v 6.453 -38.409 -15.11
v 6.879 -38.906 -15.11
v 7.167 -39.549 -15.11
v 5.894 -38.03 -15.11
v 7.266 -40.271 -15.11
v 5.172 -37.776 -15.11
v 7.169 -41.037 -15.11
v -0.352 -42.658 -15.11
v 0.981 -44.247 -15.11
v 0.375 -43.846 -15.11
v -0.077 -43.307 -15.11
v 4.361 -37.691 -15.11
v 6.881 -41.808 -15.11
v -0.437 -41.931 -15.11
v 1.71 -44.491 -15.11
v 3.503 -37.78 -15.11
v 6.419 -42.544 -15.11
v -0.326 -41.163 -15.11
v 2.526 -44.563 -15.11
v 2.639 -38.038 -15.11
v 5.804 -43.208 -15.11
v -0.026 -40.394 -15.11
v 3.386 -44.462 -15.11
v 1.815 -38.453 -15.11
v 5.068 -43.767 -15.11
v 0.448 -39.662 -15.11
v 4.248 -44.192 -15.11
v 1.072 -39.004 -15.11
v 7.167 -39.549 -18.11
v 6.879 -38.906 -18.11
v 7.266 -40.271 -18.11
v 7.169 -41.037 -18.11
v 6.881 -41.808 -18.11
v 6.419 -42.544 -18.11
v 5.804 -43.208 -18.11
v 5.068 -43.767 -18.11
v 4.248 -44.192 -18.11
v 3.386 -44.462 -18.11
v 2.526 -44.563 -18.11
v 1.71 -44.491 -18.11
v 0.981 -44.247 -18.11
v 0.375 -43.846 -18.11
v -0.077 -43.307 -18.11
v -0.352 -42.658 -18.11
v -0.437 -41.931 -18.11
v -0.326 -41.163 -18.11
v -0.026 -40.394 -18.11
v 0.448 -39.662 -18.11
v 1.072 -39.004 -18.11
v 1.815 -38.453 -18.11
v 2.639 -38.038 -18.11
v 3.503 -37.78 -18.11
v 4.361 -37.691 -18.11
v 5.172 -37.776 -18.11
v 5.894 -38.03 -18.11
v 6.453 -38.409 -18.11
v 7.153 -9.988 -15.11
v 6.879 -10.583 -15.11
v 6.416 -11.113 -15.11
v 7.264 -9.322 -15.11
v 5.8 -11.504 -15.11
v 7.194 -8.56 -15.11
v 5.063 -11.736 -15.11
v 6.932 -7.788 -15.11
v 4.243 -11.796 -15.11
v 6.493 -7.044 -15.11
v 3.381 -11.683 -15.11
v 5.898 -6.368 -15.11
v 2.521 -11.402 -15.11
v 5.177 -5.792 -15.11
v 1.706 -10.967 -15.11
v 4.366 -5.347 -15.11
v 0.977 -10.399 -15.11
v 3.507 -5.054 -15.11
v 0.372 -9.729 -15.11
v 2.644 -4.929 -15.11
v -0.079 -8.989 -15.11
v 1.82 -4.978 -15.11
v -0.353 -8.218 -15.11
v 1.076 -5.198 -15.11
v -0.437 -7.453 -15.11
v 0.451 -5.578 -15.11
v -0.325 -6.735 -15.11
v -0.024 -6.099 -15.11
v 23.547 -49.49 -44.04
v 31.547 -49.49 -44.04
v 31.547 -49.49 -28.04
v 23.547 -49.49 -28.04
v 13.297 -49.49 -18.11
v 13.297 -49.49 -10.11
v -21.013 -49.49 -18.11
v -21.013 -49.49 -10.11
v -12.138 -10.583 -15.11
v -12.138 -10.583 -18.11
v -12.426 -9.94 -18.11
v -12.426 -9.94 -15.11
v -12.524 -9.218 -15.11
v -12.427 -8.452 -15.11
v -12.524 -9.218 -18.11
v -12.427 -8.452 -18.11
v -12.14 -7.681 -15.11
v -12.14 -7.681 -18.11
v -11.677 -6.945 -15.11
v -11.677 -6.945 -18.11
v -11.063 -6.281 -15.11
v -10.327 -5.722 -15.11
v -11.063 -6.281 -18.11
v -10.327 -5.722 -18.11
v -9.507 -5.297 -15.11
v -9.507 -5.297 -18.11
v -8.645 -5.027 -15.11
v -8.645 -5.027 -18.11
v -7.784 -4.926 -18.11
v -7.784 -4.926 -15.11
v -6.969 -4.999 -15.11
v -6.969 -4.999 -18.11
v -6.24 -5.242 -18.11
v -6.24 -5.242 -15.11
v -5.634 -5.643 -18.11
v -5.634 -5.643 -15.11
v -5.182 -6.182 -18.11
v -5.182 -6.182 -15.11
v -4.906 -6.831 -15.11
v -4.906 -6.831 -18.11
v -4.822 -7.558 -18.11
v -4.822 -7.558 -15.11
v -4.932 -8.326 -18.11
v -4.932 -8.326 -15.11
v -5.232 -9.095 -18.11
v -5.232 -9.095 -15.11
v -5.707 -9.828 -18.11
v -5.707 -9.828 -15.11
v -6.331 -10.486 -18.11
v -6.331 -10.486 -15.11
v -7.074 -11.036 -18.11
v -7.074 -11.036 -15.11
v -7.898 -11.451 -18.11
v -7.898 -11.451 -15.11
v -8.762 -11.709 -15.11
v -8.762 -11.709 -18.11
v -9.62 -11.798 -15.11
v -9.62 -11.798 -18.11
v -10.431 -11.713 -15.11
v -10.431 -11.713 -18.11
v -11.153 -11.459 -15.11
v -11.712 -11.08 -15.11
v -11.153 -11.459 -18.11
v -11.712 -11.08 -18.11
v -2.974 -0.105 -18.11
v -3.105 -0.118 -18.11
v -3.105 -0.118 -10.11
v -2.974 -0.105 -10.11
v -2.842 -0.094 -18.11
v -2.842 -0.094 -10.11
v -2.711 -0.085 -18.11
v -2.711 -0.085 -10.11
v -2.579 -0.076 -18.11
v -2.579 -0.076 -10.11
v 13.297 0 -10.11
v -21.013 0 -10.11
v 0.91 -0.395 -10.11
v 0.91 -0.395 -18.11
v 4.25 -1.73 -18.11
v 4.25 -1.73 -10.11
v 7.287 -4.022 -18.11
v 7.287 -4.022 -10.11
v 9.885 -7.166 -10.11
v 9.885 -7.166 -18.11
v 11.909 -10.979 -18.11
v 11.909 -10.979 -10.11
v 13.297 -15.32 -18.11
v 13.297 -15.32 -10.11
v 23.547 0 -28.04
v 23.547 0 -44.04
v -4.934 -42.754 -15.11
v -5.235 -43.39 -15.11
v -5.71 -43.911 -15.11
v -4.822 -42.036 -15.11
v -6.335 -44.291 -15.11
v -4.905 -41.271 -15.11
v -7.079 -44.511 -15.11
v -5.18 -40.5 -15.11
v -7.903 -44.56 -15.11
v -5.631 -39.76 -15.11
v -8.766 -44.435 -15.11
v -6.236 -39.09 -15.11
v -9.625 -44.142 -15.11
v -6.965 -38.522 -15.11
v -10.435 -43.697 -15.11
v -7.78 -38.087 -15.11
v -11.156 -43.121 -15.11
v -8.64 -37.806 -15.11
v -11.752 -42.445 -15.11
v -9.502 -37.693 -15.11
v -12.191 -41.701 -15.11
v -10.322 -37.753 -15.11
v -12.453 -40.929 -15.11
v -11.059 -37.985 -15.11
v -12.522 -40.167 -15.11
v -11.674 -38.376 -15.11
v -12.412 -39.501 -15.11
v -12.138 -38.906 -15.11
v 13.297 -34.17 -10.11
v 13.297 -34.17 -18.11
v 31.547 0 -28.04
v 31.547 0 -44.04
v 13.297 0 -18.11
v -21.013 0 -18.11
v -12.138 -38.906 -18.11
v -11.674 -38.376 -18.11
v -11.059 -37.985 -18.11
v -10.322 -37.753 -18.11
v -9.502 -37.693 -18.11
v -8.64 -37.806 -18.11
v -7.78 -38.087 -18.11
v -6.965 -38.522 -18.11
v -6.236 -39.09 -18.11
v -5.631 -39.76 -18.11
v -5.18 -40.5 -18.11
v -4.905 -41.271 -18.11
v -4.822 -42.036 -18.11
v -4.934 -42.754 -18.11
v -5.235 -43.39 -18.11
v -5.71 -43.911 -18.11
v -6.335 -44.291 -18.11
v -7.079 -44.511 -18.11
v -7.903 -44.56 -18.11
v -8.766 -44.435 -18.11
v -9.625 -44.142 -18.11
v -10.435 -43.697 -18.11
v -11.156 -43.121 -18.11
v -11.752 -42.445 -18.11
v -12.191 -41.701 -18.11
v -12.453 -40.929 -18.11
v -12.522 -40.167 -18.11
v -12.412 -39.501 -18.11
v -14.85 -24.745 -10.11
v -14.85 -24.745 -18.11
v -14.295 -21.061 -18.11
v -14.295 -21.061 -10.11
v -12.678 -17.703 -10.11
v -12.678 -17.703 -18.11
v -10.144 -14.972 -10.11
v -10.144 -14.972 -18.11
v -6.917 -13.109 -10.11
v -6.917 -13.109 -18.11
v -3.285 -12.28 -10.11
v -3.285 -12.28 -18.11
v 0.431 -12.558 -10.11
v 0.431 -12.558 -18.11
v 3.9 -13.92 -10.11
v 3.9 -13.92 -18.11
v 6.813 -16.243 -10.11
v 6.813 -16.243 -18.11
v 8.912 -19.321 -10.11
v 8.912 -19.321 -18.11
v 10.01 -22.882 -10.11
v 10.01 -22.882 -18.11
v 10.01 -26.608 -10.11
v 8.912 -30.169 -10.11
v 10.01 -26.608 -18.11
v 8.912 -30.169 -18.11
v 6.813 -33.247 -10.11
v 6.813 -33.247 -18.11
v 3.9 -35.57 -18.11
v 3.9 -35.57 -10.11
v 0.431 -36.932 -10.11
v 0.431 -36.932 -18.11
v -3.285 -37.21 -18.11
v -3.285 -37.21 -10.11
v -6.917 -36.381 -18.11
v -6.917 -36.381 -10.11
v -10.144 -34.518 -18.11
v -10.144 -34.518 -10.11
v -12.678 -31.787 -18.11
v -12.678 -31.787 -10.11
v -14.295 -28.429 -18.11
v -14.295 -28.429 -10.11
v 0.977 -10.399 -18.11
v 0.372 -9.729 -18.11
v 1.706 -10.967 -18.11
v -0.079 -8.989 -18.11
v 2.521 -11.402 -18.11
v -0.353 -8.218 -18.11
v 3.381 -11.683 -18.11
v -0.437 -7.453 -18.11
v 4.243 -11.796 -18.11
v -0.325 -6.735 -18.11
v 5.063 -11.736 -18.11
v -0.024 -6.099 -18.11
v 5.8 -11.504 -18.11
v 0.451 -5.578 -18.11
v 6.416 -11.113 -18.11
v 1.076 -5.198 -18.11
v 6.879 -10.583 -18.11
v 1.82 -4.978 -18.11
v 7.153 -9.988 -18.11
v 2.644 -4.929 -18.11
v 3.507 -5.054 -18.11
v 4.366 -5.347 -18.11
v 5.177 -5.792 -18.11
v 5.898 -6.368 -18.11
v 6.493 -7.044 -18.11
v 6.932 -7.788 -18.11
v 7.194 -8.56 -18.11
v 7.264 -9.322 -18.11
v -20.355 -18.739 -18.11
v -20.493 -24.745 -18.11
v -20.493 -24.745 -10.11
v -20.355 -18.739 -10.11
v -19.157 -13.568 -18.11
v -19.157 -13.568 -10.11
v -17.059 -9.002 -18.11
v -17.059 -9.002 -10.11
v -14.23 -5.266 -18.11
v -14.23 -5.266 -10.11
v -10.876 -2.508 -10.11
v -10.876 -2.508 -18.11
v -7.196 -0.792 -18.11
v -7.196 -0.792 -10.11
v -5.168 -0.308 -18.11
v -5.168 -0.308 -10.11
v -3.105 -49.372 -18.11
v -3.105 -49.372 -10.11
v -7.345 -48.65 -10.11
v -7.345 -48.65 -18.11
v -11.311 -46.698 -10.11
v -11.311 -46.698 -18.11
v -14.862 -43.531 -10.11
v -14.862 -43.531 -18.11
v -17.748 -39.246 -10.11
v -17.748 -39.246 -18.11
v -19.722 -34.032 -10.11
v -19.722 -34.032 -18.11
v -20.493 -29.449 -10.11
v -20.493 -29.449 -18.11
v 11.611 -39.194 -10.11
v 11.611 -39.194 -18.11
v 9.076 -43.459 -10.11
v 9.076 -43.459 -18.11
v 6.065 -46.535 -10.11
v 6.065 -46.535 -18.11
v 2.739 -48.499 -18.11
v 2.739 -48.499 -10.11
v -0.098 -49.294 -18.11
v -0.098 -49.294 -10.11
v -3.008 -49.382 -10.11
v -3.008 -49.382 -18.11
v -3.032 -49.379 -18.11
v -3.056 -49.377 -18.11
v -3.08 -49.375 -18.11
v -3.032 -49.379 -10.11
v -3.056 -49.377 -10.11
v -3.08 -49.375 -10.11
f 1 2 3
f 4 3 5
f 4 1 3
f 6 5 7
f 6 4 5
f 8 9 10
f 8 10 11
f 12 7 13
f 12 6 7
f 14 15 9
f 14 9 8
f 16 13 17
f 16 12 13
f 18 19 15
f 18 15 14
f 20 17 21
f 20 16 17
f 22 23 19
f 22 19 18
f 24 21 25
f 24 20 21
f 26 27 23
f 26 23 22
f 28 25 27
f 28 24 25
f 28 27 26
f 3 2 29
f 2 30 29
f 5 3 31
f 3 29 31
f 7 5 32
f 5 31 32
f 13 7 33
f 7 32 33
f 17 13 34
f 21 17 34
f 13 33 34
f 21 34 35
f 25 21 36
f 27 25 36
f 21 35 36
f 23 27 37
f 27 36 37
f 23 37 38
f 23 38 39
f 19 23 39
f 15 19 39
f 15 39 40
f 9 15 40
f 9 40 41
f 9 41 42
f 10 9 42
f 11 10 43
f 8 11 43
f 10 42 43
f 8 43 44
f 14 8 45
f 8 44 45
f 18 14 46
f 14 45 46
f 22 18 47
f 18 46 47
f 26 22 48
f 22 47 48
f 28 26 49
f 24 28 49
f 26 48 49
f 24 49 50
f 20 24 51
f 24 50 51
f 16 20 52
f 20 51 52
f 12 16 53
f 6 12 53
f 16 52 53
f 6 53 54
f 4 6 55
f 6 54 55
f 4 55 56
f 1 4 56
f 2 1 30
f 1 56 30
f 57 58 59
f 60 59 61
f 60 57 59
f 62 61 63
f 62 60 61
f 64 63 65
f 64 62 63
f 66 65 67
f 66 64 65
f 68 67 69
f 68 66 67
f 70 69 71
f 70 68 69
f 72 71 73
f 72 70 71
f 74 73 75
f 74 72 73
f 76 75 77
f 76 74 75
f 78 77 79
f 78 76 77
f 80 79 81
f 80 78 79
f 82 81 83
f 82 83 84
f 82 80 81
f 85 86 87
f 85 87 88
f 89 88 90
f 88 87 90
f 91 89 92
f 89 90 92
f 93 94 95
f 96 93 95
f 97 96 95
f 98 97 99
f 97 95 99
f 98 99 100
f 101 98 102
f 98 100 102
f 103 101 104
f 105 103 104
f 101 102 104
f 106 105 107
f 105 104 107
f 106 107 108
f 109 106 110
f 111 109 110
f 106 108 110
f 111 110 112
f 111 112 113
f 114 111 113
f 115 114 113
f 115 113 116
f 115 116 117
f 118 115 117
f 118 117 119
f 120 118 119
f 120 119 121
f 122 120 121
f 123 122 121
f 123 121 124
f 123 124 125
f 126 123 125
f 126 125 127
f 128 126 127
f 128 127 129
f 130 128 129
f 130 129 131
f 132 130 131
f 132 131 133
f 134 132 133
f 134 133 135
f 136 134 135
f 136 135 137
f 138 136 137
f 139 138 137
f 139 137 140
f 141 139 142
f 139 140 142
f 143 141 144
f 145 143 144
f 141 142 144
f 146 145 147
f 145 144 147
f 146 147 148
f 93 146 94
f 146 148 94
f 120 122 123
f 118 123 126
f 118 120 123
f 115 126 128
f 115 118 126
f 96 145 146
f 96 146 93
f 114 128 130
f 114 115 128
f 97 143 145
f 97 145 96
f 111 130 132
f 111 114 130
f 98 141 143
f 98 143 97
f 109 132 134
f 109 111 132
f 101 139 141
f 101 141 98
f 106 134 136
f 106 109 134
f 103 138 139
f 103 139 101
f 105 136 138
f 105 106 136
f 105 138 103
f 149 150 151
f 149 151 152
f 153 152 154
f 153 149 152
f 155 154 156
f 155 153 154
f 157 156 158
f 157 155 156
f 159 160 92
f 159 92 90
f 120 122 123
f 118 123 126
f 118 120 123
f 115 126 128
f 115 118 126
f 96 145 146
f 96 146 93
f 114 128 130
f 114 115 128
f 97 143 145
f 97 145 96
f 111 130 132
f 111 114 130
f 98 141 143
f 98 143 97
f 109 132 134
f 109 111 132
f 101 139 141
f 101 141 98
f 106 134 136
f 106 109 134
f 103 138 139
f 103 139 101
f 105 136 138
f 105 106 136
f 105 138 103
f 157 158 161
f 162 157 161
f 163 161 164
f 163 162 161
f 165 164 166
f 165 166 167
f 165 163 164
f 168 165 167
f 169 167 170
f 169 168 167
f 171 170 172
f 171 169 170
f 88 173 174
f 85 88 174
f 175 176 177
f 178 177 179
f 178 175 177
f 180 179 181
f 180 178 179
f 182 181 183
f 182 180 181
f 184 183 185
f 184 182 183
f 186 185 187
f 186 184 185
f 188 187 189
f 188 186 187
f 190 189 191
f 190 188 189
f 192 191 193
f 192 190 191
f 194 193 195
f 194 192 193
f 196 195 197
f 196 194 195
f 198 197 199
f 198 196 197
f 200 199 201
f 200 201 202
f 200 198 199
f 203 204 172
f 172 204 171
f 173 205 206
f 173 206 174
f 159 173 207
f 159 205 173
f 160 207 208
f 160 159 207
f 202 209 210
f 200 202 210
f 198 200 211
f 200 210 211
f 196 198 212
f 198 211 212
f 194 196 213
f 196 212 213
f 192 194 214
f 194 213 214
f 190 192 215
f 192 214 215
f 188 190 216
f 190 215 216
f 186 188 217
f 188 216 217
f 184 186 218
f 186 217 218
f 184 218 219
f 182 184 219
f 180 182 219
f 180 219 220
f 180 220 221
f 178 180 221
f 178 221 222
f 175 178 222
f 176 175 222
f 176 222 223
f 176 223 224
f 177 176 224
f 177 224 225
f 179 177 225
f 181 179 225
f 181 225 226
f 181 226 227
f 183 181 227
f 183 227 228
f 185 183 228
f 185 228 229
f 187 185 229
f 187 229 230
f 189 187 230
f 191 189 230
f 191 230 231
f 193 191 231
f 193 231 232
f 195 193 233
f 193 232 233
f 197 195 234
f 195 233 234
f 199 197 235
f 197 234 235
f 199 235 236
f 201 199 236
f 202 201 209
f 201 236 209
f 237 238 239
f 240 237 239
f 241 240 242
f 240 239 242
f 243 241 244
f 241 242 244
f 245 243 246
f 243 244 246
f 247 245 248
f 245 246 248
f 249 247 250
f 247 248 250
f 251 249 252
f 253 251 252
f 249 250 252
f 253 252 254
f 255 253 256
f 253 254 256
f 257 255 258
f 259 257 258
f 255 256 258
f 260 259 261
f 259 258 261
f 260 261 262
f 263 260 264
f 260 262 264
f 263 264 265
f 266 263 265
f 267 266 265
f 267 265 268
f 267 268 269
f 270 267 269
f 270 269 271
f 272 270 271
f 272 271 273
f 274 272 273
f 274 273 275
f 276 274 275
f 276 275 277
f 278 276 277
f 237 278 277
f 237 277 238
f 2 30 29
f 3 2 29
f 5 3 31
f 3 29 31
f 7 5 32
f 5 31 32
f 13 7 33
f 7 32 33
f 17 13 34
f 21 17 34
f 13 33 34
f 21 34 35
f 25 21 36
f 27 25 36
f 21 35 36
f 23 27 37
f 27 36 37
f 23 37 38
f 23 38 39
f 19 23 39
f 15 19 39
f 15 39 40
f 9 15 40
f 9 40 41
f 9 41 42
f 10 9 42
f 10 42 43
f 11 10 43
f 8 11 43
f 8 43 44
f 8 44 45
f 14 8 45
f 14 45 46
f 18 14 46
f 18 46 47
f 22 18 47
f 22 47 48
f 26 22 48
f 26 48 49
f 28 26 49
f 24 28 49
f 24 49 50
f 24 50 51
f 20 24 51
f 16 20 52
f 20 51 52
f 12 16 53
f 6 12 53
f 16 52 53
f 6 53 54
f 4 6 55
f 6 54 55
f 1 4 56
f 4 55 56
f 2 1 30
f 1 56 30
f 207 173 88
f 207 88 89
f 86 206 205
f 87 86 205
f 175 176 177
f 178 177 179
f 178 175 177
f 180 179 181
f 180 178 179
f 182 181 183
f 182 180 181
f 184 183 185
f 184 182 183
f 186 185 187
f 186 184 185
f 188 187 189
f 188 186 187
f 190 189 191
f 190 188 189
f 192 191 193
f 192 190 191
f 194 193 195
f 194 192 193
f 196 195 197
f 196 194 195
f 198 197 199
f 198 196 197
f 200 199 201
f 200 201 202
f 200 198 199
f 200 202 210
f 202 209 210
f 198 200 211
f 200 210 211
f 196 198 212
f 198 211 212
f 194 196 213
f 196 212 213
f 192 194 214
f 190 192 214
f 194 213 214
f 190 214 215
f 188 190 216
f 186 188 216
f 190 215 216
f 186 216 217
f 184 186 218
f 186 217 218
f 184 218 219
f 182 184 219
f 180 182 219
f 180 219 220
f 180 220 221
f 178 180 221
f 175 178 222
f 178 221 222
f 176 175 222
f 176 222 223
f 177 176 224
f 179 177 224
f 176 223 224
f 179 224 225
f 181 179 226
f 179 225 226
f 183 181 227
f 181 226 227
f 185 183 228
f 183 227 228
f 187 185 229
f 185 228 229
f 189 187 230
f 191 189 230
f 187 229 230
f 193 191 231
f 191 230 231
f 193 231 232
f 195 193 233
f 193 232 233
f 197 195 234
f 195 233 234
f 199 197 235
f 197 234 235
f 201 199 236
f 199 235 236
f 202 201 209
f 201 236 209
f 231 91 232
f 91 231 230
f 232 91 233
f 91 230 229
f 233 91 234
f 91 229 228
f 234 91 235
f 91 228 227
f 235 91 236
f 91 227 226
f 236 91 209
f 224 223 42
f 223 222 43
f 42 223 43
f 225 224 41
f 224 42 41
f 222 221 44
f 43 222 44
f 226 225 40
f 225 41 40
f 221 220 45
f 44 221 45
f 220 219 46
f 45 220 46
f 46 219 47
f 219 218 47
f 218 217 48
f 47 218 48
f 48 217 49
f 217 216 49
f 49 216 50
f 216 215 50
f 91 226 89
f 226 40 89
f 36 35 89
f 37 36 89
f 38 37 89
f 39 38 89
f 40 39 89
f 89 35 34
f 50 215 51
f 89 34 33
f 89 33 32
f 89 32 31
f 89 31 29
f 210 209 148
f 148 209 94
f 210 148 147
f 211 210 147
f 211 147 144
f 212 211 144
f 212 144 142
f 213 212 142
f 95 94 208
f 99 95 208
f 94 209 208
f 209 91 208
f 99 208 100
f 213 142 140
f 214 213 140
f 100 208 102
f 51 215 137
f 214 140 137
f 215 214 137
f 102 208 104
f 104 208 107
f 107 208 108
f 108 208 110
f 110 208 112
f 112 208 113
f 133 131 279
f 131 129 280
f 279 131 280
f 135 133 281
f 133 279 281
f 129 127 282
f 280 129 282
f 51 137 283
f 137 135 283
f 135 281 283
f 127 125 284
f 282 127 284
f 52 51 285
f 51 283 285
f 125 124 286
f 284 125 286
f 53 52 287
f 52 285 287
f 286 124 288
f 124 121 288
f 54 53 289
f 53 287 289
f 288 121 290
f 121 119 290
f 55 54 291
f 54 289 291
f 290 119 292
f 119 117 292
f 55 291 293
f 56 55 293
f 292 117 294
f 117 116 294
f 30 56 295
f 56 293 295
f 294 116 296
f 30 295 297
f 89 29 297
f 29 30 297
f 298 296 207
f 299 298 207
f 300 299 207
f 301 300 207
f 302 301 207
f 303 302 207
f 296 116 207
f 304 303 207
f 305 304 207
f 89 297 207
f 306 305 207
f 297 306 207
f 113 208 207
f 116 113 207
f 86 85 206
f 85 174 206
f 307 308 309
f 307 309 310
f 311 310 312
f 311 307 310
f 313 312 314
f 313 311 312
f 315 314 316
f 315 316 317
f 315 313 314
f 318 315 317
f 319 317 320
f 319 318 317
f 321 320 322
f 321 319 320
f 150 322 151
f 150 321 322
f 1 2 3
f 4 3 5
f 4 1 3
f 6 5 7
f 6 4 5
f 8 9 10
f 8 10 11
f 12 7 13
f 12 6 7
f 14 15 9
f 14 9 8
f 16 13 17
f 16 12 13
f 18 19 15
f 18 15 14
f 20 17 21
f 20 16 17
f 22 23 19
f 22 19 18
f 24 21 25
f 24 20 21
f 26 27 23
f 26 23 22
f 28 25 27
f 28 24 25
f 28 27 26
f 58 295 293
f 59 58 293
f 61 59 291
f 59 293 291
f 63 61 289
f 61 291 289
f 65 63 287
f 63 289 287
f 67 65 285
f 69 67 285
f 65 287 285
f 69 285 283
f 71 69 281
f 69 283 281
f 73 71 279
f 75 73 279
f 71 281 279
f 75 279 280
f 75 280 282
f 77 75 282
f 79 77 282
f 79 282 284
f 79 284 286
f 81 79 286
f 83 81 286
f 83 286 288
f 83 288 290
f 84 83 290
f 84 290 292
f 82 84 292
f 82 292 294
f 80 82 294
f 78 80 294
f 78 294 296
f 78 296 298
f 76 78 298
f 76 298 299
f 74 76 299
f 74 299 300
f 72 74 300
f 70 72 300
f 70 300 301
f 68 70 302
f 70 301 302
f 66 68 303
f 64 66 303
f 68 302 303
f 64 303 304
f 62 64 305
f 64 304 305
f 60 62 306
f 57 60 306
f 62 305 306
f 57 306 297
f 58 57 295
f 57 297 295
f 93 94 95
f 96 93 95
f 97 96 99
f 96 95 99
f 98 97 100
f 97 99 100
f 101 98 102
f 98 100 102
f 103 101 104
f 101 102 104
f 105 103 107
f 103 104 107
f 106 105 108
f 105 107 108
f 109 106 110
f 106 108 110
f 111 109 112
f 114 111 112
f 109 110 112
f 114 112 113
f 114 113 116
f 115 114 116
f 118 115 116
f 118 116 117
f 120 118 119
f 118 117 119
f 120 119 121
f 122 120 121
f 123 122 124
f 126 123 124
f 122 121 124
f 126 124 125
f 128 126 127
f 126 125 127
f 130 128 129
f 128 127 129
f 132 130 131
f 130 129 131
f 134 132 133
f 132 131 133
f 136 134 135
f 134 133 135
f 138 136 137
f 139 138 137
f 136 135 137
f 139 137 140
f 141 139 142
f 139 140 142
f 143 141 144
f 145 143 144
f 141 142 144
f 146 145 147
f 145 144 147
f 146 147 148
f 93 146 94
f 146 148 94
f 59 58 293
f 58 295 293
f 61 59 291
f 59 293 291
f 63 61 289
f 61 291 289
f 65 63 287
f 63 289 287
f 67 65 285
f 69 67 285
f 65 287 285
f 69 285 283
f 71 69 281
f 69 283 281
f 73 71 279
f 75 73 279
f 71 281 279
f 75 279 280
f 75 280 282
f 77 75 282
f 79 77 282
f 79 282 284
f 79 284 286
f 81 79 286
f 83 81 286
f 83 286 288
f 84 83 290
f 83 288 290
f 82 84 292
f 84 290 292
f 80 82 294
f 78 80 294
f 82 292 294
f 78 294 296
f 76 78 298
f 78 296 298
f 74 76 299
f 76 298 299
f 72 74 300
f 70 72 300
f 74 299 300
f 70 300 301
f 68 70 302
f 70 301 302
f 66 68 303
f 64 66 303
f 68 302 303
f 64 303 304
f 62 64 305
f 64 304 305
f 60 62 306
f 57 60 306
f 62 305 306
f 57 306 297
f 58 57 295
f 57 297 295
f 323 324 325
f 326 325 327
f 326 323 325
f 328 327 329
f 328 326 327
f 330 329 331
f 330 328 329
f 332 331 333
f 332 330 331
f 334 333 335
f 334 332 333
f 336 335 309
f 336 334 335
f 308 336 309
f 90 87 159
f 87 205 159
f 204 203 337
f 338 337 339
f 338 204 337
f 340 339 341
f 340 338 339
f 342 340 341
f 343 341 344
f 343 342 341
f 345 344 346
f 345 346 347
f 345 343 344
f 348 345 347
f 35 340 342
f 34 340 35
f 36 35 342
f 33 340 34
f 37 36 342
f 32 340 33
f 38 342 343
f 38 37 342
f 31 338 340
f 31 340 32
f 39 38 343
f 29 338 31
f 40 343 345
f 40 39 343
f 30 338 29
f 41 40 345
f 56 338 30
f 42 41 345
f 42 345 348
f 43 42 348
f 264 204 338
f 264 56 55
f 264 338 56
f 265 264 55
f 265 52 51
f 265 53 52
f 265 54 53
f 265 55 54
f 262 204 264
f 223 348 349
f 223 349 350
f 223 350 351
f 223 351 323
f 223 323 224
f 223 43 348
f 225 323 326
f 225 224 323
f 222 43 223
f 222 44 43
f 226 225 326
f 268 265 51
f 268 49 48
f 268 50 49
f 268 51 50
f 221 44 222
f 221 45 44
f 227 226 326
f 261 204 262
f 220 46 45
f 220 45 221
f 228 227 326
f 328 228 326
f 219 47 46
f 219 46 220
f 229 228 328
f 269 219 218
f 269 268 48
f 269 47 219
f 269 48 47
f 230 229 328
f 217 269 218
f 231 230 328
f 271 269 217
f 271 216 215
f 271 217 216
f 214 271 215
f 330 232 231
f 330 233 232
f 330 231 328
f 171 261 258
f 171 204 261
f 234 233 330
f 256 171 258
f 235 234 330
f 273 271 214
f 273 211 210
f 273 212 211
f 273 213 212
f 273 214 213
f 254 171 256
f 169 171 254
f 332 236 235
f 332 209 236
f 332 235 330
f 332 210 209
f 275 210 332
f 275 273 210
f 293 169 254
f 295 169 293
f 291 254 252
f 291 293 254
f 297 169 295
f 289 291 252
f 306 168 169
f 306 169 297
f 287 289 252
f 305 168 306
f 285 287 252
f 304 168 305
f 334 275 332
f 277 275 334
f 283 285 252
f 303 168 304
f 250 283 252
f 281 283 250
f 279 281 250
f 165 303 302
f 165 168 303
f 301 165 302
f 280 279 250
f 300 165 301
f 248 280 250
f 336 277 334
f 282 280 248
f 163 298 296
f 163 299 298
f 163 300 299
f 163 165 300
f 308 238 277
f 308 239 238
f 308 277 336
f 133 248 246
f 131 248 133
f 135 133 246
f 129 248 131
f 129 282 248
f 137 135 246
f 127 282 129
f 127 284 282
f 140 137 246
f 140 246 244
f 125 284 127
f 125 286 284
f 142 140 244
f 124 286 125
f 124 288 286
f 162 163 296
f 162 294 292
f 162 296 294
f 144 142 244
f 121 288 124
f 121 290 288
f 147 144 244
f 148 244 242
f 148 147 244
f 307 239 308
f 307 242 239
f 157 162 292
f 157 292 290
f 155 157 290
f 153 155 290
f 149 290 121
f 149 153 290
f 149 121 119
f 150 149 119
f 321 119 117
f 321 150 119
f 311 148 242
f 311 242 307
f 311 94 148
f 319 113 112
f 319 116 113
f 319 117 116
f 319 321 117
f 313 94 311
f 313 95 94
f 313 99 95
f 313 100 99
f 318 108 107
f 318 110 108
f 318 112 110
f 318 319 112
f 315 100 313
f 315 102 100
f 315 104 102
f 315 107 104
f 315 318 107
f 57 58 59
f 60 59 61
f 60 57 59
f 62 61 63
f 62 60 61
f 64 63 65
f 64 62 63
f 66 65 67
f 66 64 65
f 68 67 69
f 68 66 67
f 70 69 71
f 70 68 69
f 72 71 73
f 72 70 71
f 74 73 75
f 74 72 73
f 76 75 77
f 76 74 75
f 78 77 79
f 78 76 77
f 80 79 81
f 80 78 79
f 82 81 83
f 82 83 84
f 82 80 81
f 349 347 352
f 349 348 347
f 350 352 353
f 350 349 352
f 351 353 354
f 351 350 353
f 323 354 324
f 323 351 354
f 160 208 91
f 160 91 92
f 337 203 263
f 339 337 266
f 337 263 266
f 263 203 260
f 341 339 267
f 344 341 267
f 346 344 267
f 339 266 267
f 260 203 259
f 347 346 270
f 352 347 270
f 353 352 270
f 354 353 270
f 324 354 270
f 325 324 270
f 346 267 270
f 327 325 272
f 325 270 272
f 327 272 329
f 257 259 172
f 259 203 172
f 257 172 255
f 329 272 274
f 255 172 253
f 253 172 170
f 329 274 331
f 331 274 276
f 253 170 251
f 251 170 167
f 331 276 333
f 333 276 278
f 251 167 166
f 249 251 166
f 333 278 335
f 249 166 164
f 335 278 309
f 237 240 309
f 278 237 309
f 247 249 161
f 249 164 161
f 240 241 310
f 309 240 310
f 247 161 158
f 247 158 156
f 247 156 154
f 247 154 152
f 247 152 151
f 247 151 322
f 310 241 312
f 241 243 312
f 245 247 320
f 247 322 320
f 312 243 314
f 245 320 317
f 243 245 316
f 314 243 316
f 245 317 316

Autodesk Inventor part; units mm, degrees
ref_plane "YZ Plane" through (0, 0, 0) normal (1, 0, 0) x (0, 1, 0)
sketch "Основной эскиз" plane through (0, 0, 0) normal (0, 1, 0) x (-1, 0, 0)
  line L0 (21.0127, -18.1102) -> (-13.2973, -18.1102)
  line L1 (21.0127, -18.1102) -> (21.0127, -10.1102)
  line L2 (21.0127, -10.1102) -> (-13.2973, -10.1102)
  line L3 (20.451, -28.0402) -> (-43.6243, -28.0402)
  line L4 (-23.5473, -28.0402) -> (-23.5473, -44.0402)
  line L5 (-23.5473, -44.0402) -> (-31.5473, -44.0402)
  line L6 (-31.5473, -44.0402) -> (-31.5473, -28.0402)
  line L7 (-31.5473, -28.0402) -> (-13.2973, -10.1102)
  line L8 (-23.5473, -28.0402) -> (-13.2973, -18.1102)
  line L9 (-5.2293, -36.0402) -> (-38.0765, -36.0402)
  line L10 (31.3847, -10.1102) -> (-49.5844, -10.1102)
  line L11 (3.1555, -40.2525) -> (3.1555, 5.5167)
  point P0 (0, 0)
  point P1 (-23.5473, -36.0402)
  dimension "d0" = 34.31
  dimension "d2" = 8
  dimension "d3" = 34.31
  dimension "d5" = 8
  dimension "d7" = 17.93
  dimension "d8" = 25.93
  dimension "d9" = 10.25
  dimension "d10" = 8
extrude "ВыдавливаниеОсновной" add sketch "Основной эскиз" against normal blind 49.49 contours L0 L11 L2 L1 | L0 L8 L3 L7 L2 L11 | L4 L9 L6 L3 | L4 L5 L6 L9
ref_plane "РабПлоскость18" through (13.2973, 0, -18.1102) normal (0, 0, -1) x (-1, 0, 0)
ref_plane "РабПлоскость41" through (13.0446, -16.4427, -18.1102) normal (0.6958, 0.0022, 0.7182) x (0.0031, -1, 0)
sketch "Ручка" plane through (13.0446, -16.4427, -18.1102) normal (0.6958, 0.0022, 0.7182) x (0.0031, -1, 0)
  arc A0 (13.7315, 14.434) -> (17.6656, 0.1628) centre (18.6248, 8.105) ccw
  arc A1 (14.1675, 14.7411) -> (13.7315, 14.434) centre (17.4015, 9.6873) ccw
  arc A2 (-1.0594, 0.1628) -> (2.3115, 14.434) centre (-2.4886, 8.0341) ccw
  line L0 (2.3115, 14.434) -> (13.7315, 14.434)
  line L1 (-1.0594, 0.1628) -> (17.6656, 0.1628)
  line L2 (17.728, 0.1415) -> (-1.1219, 0.184) projected
  point P0 (-16.4836, -21.933)
  point P1 (-16.4096, 14.4897)
  point P2 (12.9792, 13.7423)
  point P3 (8.3031, 0.1628)
  dimension "d341" = 16
  dimension "d345" = 12
  dimension "d352" = 11.42
  dimension "d353" = 14.2712
extrude "Выдавливание32" [suppressed]
sketch "Отвертстия" plane through (13.2973, 0, -18.1102) normal (0, 0, -1) x (-1, 0, 0)
  line L0 (48.4897, -24.745) -> (-16.3078, -24.745)
  line L1 (0, 0) -> (34.31, 0) projected
  line L2 (34.31, -49.49) -> (0, -49.49) projected
  line L3 (34.31, 0) -> (34.31, -49.49) projected
  circle A0 centre (15.6477, -24.745) radius 12.5
  ellipse E0 centre (15.7193, -26.6222) end of major axis (16.7788, -49.3596) minor radius 18.1572 (16.4021, -49.3722) -> (33.79, -24.745) ccw
  ellipse E1 centre (15.7193, -22.8678) end of major axis (16.7788, -0.1304) minor radius 18.1572 (33.79, -24.745) -> (16.4021, -0.1178) ccw
  ellipse E2 centre (15.7193, -26.6222) end of major axis (14.6417, -49.4193) minor radius 16.4679 (0, -34.17) -> (16.4021, -49.3722) ccw
  ellipse E3 centre (15.7193, -22.8678) end of major axis (14.6417, -0.0707) minor radius 16.4679 (16.4021, -0.1178) -> (0, -15.32) ccw
  line L4 (0, -34.17) -> (0, -15.32)
  line L5 (0, 0) -> (0, -49.49) projected
  line L6 (16.4339, -64.2485) -> (15.7511, 14.4026)
  point P0 (17.155, 0)
  point P1 (0, -24.745)
  point P2 (16.091, -24.745)
  dimension "d31" = 25
  dimension "d329" = 18.85
extrude "Корпус элипса" add sketch "Отвертстия" against normal blind 8 separate body contours E0 E2 L6 A0 L0 | L0 A0 L6 E3 E1 | A0 L0 L4 E3 L6 | L6 E2 L4 L0 A0
sketch "Эскиз42" plane through (13.2973, 0, -18.1102) normal (0, 0, -1) x (-1, 0, 0)
  ellipse E0 centre (9.8832, -41.1273) end of major axis (6.418, -38.906) minor radius 3.115
  line L0 (48.3173, -24.7445) -> (-16.4639, -24.7445) projected
  ellipse E1 centre (9.8832, -8.3617) end of major axis (6.418, -10.5829) minor radius 3.115
  line L1 (15.9267, -61.1755) -> (15.9267, 11.6866)
  ellipse E2 centre (21.9702, -41.1273) end of major axis (25.4354, -38.906) minor radius 3.115
  ellipse E3 centre (21.9702, -8.3617) end of major axis (25.4354, -10.5829) minor radius 3.115
  point P0 (13.2973, 0)
  point P1 (15.9267, -24.7445)
  dimension "d401" = 4.116
  dimension "d402" = 3.115
extrude "Дырки" cut sketch "Эскиз42" against normal blind 3
properties part number "lw_4_2_крепление_yjdjt"
